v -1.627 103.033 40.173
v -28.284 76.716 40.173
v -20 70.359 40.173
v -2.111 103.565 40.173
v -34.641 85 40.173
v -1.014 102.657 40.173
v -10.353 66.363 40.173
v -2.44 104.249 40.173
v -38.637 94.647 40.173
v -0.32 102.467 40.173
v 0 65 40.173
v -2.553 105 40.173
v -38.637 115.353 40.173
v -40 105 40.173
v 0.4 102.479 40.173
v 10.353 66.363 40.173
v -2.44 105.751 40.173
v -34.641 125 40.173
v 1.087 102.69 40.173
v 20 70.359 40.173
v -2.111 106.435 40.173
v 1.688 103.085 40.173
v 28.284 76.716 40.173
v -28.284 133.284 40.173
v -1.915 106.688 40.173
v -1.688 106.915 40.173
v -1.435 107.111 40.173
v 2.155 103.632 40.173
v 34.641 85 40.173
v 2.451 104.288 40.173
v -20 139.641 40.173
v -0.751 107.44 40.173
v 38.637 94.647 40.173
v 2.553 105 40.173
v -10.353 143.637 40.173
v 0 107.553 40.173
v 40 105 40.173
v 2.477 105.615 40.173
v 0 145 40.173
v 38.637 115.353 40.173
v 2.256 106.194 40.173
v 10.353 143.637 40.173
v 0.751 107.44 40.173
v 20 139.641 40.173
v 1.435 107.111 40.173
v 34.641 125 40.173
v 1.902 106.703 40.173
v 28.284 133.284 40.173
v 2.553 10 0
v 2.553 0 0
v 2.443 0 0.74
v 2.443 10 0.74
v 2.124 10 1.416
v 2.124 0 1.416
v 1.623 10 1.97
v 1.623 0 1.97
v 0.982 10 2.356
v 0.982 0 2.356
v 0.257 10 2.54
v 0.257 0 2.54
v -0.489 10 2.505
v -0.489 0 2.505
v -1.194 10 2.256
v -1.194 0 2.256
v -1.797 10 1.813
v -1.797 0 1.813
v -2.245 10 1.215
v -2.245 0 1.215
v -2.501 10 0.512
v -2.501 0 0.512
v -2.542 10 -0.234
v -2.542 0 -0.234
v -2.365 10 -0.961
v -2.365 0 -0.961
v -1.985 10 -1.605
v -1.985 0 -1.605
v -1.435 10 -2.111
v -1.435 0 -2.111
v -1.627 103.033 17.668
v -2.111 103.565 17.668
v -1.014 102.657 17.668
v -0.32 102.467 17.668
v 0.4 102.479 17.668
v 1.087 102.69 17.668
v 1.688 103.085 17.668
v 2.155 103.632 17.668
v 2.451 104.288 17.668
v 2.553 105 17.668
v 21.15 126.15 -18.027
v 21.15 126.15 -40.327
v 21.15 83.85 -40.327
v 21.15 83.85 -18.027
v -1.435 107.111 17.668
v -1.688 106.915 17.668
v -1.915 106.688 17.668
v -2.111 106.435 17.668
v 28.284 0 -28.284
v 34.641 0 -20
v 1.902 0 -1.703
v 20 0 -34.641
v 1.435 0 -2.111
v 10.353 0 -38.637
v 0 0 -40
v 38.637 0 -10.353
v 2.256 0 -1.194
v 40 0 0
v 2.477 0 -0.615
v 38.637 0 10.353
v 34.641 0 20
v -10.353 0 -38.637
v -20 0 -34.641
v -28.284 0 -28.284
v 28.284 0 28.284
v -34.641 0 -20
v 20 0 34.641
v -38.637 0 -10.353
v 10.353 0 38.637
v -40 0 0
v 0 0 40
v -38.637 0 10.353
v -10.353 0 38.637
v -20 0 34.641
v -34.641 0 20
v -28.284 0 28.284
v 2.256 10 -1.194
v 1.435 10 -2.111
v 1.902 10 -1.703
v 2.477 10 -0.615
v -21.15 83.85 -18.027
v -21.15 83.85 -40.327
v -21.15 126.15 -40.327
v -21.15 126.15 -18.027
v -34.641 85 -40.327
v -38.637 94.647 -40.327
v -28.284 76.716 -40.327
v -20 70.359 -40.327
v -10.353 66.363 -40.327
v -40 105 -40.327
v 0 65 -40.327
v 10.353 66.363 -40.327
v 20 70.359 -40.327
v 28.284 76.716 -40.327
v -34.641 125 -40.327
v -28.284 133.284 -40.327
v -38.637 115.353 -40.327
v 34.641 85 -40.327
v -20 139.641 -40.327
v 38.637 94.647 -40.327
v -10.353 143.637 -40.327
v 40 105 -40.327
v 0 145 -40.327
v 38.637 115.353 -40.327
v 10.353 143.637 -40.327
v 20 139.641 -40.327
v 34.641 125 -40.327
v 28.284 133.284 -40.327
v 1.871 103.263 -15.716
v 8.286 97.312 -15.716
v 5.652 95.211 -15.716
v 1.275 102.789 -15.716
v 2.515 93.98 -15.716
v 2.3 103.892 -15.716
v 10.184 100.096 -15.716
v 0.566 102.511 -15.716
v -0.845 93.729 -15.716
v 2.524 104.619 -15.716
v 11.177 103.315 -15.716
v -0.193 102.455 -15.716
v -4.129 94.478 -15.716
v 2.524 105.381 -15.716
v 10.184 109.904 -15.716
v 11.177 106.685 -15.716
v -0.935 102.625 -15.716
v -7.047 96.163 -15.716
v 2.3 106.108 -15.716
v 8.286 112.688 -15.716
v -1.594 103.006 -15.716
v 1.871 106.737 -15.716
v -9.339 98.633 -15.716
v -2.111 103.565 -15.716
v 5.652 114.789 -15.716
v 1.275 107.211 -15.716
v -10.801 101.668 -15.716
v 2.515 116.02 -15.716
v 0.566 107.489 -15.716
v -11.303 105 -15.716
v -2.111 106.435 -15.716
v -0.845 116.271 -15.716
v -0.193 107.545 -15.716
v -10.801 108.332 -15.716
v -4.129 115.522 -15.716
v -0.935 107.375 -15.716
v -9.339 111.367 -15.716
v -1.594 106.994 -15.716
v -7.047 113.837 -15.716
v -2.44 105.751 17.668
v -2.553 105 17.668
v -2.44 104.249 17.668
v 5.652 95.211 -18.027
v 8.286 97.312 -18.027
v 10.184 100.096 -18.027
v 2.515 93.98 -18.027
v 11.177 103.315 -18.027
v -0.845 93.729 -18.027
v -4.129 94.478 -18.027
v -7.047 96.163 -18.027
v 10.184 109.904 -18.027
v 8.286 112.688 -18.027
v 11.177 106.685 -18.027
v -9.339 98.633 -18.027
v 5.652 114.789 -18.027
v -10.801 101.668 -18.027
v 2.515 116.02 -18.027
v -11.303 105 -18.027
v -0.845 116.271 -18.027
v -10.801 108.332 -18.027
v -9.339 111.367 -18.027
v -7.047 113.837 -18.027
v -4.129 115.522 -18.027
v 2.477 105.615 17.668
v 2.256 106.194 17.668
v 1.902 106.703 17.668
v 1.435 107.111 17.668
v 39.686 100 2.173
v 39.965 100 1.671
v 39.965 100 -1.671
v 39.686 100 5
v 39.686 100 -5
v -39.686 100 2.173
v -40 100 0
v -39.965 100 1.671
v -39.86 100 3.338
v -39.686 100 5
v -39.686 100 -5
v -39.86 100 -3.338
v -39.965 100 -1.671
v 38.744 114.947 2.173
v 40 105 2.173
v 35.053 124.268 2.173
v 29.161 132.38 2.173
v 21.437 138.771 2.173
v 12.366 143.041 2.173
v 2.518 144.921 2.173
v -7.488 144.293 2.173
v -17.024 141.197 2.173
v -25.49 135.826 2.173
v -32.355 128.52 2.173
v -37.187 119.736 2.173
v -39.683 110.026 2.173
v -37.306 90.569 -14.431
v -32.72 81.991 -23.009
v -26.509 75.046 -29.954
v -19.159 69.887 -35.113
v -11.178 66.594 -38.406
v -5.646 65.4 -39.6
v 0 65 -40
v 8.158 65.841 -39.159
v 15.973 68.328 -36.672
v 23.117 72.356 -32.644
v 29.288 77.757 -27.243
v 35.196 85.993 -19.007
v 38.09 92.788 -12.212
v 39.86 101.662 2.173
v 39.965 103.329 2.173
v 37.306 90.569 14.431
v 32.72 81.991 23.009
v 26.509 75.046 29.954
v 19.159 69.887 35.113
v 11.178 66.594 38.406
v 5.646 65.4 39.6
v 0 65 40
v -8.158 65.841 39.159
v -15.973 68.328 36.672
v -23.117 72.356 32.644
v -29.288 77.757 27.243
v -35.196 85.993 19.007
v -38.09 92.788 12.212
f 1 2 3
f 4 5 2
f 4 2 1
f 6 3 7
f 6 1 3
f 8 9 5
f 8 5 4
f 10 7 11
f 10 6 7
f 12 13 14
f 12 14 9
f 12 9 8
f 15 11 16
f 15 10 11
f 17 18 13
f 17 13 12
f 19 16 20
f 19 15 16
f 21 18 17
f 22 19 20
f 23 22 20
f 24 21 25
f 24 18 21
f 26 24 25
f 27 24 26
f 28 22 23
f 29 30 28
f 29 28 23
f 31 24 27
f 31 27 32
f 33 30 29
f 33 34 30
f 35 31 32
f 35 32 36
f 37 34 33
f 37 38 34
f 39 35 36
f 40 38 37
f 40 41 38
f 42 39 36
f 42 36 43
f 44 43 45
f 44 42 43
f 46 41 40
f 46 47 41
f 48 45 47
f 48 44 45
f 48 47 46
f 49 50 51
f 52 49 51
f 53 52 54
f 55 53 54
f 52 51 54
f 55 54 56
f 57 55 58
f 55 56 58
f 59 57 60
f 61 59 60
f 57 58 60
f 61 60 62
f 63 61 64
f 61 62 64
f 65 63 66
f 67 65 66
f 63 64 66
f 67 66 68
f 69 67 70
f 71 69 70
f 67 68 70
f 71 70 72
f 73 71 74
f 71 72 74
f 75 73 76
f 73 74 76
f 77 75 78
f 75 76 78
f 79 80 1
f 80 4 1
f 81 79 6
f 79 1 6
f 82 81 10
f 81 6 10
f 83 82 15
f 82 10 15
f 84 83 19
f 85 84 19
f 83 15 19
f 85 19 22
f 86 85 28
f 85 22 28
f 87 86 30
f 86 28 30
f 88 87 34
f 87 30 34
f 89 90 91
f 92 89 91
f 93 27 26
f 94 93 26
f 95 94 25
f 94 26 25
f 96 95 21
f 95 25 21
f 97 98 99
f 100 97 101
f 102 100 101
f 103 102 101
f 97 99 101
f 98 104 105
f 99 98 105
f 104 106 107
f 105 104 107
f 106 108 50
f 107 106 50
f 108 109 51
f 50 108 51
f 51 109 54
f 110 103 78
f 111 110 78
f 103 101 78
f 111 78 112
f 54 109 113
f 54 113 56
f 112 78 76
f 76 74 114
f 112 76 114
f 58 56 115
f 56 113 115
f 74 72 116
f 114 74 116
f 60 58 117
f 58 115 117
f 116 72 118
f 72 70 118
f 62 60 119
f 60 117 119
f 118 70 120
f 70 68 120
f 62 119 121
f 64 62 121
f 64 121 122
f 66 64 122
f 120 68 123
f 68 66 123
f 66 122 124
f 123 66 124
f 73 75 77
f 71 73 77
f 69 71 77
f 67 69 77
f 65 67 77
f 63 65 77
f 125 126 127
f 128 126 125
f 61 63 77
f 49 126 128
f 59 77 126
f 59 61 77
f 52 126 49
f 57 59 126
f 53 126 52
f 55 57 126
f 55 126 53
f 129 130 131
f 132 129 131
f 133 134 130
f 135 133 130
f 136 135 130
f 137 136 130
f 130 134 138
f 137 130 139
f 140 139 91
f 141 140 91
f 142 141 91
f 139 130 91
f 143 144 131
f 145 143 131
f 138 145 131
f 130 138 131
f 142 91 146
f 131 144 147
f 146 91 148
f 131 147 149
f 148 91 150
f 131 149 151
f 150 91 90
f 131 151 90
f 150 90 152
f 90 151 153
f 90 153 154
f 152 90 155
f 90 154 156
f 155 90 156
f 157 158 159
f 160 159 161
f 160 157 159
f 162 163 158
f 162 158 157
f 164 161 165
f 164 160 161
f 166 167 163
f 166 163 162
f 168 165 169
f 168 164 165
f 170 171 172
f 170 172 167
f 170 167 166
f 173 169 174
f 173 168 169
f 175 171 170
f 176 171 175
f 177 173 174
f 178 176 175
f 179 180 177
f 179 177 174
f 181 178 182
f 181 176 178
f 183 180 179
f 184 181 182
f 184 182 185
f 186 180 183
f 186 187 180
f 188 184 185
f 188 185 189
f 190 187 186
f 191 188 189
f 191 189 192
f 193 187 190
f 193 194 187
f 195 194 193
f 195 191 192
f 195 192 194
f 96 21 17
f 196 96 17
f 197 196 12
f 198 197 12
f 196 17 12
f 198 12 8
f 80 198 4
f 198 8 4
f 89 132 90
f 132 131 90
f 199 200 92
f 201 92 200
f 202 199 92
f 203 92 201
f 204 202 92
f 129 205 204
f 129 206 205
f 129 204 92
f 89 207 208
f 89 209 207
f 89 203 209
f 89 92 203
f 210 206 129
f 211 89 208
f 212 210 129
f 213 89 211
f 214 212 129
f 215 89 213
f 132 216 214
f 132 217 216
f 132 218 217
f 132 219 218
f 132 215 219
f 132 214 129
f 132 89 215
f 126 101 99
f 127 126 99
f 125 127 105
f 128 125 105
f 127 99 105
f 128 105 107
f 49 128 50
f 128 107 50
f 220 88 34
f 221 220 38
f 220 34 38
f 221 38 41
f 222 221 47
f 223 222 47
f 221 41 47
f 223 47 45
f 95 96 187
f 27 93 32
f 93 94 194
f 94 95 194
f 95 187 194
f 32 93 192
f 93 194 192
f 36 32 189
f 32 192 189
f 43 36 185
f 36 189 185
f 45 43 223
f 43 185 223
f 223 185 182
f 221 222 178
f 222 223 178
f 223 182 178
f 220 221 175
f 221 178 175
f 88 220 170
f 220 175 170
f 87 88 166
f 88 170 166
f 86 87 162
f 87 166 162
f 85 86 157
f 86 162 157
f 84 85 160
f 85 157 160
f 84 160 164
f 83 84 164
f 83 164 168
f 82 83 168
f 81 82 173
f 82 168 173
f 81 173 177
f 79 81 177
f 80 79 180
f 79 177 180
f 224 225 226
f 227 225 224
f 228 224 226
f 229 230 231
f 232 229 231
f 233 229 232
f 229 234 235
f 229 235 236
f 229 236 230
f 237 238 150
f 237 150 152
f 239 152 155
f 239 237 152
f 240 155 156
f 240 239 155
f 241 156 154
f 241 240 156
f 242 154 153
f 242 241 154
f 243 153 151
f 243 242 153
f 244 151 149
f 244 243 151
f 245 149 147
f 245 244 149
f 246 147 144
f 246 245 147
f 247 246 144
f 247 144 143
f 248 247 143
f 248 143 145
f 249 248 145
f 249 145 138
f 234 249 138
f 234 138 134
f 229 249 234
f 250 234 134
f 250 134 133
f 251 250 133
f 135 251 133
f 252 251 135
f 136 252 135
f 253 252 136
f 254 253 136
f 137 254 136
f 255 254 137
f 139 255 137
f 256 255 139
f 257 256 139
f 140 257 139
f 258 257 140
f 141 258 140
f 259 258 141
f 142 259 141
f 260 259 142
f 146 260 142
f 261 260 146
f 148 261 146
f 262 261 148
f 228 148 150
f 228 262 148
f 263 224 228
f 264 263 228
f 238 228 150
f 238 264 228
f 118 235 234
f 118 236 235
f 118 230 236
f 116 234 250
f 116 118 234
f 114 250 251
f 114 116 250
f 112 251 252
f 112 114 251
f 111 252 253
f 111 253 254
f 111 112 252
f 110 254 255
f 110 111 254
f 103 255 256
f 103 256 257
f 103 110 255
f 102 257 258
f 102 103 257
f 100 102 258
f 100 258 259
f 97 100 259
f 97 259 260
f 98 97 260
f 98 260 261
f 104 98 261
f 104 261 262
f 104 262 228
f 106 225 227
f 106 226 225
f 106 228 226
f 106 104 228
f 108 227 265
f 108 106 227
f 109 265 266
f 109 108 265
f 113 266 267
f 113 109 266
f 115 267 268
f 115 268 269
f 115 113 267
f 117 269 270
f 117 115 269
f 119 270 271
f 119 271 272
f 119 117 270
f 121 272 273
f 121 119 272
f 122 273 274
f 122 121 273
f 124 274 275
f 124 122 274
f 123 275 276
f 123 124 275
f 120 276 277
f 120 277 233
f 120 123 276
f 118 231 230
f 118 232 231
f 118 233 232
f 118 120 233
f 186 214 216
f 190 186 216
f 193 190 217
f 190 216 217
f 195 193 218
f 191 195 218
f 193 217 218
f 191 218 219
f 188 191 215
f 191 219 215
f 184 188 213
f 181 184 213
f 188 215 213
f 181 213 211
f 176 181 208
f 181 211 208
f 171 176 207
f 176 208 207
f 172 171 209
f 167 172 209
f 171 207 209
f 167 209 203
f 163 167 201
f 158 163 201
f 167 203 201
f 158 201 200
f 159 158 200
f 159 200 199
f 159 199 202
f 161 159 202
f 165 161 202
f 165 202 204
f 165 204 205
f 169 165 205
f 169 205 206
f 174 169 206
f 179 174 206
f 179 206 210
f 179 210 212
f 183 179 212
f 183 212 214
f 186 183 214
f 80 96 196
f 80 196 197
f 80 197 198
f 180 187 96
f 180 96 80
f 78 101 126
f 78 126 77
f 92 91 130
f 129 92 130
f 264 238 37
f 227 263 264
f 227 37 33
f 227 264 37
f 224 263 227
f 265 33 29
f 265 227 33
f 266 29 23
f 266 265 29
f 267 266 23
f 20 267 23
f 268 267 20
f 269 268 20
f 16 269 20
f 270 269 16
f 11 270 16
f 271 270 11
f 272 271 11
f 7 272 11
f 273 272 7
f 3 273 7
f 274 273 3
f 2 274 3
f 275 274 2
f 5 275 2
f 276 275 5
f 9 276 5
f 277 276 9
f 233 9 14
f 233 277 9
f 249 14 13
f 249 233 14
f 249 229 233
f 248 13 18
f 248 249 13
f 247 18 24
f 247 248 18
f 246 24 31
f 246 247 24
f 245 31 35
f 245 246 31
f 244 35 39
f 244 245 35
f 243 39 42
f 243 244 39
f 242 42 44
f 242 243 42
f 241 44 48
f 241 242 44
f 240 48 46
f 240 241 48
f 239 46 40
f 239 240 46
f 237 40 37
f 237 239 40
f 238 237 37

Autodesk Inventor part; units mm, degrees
ref_plane "YZ Plane" through (0, 0, 0) normal (1, 0, 0) x (0, 1, 0)
ref_plane "XZ Plane" through (0, 0, 0) normal (0, 1, 0) x (-1, 0, 0)
ref_plane "XY Plane" through (0, 0, 0) normal (0, 0, 1) x (1, 0, 0)
sketch "Sketch1" plane through (0, 0, 0) normal (0, 1, 0) x (-1, 0, 0)
  circle A0 centre (0, 0) radius 40
  dimension "d0" = 80
extrude "Extrusion1" add sketch "Sketch1" along normal blind 100
sketch "Sketch2" plane through (0, 100, 0) normal (0, 1, 0) x (1, 0, 0)
  line L0 (-10.8438, 4.9816) -> (0, 4.9816)
  line L1 (0, 4.9816) -> (0, -2.1726)
  line L2 (0, -2.1726) -> (-10.8438, -2.1726)
  line L3 (-10.8438, -2.1726) -> (-10.8438, 4.9816)
  point P0 (0, 0)
extrude "Extrusion2" add sketch "Sketch2" along normal blind 10
sketch "Sketch3" plane through (-10.8438, 100, 2.1726) normal (0, 0, 1) x (1, 0, 0)
  line L0 (10.8438, 0) -> (10.8438, 10) projected
  circle A0 centre (10.8438, 5) radius 40
  point P0 (10.8438, -100)
  dimension "d5" = 80
extrude "Extrusion3" add sketch "Sketch3" along normal blind 38 and the other way blind 42.5
sketch "Sketch4" plane through (-10.8438, 100, 40.1726) normal (0, 0, 1) x (1, 0, 0)
  circle A0 centre (10.8438, 5) radius 2.5527
  line L0 (9.4087, 7.1111) -> (12.2789, 7.1111)
  circle A1 centre (10.8438, 5) radius 40 projected
  point P0 (10.8438, -100)
  dimension "d10" = 5.1054
  dimension "d11" = 2.8702
extrude "Extrusion4" cut sketch "Sketch4" against normal blind 22.5044 contours A0 L0 picked at (10.9442, 5.5624)
sketch "Sketch5" plane through (0, 0, 0) normal (0, -1, 0) x (1, 0, 0)
  circle A0 centre (0, 0) radius 2.5527
  line L0 (1.4351, -2.1111) -> (-1.4351, -2.1111)
  dimension "d14" = 5.1054
  dimension "d15" = 2.8702
extrude "Extrusion5" cut sketch "Sketch5" against normal blind 10 contours A0 L0 picked at (0.1004, -0.5624)
sketch "Sketch6" plane through (0, 105, -40.3274) normal (0, 0, -1) x (-1, 0, 0)
  line L0 (-21.15, -21.15) -> (21.15, -21.15)
  line L1 (21.15, -21.15) -> (21.15, 21.15)
  line L2 (21.15, 21.15) -> (-21.15, 21.15)
  line L3 (-21.15, 21.15) -> (-21.15, -21.15)
  line L4 (-21.15, -21.15) -> (21.15, 21.15) construction
  line L5 (21.15, -21.15) -> (-21.15, 21.15) construction
  circle A0 centre (0, 0) radius 40 projected
  point P0 (0, -105)
  dimension "d18" = 42.3
  dimension "d19" = 42.3
  dimension "d27" = 21.15
  dimension "d28" = 21.15
extrude "Extrusion6" cut sketch "Sketch6" against normal blind 22.3 contours L3 L2 L1 L0
sketch "Sketch7" plane through (0, 105, -18.0274) normal (0, 0, -1) x (-1, 0, 0)
  circle A0 centre (0, 0) radius 11.303
  circle A1 centre (0, 0) radius 40 projected
  point P0 (0, -105)
  dimension "d22" = 22.606
extrude "Extrusion7" cut sketch "Sketch7" against normal blind 2.3114 contours A0
sketch "Sketch8" plane through (0, 105, -15.716) normal (0, 0, -1) x (-1, 0, 0)
  circle A0 centre (0, 0) radius 2.5527
  line L0 (2.1111, 1.4351) -> (2.1111, -1.4351)
  circle A1 centre (0, 0) radius 40 projected
  point P0 (0, -105)
  dimension "d25" = 5.1054
  dimension "d26" = 2.8702
extrude "Extrusion8" cut sketch "Sketch8" against normal blind 60 contours L0 A0 picked at (0.5627, -0.1029)
